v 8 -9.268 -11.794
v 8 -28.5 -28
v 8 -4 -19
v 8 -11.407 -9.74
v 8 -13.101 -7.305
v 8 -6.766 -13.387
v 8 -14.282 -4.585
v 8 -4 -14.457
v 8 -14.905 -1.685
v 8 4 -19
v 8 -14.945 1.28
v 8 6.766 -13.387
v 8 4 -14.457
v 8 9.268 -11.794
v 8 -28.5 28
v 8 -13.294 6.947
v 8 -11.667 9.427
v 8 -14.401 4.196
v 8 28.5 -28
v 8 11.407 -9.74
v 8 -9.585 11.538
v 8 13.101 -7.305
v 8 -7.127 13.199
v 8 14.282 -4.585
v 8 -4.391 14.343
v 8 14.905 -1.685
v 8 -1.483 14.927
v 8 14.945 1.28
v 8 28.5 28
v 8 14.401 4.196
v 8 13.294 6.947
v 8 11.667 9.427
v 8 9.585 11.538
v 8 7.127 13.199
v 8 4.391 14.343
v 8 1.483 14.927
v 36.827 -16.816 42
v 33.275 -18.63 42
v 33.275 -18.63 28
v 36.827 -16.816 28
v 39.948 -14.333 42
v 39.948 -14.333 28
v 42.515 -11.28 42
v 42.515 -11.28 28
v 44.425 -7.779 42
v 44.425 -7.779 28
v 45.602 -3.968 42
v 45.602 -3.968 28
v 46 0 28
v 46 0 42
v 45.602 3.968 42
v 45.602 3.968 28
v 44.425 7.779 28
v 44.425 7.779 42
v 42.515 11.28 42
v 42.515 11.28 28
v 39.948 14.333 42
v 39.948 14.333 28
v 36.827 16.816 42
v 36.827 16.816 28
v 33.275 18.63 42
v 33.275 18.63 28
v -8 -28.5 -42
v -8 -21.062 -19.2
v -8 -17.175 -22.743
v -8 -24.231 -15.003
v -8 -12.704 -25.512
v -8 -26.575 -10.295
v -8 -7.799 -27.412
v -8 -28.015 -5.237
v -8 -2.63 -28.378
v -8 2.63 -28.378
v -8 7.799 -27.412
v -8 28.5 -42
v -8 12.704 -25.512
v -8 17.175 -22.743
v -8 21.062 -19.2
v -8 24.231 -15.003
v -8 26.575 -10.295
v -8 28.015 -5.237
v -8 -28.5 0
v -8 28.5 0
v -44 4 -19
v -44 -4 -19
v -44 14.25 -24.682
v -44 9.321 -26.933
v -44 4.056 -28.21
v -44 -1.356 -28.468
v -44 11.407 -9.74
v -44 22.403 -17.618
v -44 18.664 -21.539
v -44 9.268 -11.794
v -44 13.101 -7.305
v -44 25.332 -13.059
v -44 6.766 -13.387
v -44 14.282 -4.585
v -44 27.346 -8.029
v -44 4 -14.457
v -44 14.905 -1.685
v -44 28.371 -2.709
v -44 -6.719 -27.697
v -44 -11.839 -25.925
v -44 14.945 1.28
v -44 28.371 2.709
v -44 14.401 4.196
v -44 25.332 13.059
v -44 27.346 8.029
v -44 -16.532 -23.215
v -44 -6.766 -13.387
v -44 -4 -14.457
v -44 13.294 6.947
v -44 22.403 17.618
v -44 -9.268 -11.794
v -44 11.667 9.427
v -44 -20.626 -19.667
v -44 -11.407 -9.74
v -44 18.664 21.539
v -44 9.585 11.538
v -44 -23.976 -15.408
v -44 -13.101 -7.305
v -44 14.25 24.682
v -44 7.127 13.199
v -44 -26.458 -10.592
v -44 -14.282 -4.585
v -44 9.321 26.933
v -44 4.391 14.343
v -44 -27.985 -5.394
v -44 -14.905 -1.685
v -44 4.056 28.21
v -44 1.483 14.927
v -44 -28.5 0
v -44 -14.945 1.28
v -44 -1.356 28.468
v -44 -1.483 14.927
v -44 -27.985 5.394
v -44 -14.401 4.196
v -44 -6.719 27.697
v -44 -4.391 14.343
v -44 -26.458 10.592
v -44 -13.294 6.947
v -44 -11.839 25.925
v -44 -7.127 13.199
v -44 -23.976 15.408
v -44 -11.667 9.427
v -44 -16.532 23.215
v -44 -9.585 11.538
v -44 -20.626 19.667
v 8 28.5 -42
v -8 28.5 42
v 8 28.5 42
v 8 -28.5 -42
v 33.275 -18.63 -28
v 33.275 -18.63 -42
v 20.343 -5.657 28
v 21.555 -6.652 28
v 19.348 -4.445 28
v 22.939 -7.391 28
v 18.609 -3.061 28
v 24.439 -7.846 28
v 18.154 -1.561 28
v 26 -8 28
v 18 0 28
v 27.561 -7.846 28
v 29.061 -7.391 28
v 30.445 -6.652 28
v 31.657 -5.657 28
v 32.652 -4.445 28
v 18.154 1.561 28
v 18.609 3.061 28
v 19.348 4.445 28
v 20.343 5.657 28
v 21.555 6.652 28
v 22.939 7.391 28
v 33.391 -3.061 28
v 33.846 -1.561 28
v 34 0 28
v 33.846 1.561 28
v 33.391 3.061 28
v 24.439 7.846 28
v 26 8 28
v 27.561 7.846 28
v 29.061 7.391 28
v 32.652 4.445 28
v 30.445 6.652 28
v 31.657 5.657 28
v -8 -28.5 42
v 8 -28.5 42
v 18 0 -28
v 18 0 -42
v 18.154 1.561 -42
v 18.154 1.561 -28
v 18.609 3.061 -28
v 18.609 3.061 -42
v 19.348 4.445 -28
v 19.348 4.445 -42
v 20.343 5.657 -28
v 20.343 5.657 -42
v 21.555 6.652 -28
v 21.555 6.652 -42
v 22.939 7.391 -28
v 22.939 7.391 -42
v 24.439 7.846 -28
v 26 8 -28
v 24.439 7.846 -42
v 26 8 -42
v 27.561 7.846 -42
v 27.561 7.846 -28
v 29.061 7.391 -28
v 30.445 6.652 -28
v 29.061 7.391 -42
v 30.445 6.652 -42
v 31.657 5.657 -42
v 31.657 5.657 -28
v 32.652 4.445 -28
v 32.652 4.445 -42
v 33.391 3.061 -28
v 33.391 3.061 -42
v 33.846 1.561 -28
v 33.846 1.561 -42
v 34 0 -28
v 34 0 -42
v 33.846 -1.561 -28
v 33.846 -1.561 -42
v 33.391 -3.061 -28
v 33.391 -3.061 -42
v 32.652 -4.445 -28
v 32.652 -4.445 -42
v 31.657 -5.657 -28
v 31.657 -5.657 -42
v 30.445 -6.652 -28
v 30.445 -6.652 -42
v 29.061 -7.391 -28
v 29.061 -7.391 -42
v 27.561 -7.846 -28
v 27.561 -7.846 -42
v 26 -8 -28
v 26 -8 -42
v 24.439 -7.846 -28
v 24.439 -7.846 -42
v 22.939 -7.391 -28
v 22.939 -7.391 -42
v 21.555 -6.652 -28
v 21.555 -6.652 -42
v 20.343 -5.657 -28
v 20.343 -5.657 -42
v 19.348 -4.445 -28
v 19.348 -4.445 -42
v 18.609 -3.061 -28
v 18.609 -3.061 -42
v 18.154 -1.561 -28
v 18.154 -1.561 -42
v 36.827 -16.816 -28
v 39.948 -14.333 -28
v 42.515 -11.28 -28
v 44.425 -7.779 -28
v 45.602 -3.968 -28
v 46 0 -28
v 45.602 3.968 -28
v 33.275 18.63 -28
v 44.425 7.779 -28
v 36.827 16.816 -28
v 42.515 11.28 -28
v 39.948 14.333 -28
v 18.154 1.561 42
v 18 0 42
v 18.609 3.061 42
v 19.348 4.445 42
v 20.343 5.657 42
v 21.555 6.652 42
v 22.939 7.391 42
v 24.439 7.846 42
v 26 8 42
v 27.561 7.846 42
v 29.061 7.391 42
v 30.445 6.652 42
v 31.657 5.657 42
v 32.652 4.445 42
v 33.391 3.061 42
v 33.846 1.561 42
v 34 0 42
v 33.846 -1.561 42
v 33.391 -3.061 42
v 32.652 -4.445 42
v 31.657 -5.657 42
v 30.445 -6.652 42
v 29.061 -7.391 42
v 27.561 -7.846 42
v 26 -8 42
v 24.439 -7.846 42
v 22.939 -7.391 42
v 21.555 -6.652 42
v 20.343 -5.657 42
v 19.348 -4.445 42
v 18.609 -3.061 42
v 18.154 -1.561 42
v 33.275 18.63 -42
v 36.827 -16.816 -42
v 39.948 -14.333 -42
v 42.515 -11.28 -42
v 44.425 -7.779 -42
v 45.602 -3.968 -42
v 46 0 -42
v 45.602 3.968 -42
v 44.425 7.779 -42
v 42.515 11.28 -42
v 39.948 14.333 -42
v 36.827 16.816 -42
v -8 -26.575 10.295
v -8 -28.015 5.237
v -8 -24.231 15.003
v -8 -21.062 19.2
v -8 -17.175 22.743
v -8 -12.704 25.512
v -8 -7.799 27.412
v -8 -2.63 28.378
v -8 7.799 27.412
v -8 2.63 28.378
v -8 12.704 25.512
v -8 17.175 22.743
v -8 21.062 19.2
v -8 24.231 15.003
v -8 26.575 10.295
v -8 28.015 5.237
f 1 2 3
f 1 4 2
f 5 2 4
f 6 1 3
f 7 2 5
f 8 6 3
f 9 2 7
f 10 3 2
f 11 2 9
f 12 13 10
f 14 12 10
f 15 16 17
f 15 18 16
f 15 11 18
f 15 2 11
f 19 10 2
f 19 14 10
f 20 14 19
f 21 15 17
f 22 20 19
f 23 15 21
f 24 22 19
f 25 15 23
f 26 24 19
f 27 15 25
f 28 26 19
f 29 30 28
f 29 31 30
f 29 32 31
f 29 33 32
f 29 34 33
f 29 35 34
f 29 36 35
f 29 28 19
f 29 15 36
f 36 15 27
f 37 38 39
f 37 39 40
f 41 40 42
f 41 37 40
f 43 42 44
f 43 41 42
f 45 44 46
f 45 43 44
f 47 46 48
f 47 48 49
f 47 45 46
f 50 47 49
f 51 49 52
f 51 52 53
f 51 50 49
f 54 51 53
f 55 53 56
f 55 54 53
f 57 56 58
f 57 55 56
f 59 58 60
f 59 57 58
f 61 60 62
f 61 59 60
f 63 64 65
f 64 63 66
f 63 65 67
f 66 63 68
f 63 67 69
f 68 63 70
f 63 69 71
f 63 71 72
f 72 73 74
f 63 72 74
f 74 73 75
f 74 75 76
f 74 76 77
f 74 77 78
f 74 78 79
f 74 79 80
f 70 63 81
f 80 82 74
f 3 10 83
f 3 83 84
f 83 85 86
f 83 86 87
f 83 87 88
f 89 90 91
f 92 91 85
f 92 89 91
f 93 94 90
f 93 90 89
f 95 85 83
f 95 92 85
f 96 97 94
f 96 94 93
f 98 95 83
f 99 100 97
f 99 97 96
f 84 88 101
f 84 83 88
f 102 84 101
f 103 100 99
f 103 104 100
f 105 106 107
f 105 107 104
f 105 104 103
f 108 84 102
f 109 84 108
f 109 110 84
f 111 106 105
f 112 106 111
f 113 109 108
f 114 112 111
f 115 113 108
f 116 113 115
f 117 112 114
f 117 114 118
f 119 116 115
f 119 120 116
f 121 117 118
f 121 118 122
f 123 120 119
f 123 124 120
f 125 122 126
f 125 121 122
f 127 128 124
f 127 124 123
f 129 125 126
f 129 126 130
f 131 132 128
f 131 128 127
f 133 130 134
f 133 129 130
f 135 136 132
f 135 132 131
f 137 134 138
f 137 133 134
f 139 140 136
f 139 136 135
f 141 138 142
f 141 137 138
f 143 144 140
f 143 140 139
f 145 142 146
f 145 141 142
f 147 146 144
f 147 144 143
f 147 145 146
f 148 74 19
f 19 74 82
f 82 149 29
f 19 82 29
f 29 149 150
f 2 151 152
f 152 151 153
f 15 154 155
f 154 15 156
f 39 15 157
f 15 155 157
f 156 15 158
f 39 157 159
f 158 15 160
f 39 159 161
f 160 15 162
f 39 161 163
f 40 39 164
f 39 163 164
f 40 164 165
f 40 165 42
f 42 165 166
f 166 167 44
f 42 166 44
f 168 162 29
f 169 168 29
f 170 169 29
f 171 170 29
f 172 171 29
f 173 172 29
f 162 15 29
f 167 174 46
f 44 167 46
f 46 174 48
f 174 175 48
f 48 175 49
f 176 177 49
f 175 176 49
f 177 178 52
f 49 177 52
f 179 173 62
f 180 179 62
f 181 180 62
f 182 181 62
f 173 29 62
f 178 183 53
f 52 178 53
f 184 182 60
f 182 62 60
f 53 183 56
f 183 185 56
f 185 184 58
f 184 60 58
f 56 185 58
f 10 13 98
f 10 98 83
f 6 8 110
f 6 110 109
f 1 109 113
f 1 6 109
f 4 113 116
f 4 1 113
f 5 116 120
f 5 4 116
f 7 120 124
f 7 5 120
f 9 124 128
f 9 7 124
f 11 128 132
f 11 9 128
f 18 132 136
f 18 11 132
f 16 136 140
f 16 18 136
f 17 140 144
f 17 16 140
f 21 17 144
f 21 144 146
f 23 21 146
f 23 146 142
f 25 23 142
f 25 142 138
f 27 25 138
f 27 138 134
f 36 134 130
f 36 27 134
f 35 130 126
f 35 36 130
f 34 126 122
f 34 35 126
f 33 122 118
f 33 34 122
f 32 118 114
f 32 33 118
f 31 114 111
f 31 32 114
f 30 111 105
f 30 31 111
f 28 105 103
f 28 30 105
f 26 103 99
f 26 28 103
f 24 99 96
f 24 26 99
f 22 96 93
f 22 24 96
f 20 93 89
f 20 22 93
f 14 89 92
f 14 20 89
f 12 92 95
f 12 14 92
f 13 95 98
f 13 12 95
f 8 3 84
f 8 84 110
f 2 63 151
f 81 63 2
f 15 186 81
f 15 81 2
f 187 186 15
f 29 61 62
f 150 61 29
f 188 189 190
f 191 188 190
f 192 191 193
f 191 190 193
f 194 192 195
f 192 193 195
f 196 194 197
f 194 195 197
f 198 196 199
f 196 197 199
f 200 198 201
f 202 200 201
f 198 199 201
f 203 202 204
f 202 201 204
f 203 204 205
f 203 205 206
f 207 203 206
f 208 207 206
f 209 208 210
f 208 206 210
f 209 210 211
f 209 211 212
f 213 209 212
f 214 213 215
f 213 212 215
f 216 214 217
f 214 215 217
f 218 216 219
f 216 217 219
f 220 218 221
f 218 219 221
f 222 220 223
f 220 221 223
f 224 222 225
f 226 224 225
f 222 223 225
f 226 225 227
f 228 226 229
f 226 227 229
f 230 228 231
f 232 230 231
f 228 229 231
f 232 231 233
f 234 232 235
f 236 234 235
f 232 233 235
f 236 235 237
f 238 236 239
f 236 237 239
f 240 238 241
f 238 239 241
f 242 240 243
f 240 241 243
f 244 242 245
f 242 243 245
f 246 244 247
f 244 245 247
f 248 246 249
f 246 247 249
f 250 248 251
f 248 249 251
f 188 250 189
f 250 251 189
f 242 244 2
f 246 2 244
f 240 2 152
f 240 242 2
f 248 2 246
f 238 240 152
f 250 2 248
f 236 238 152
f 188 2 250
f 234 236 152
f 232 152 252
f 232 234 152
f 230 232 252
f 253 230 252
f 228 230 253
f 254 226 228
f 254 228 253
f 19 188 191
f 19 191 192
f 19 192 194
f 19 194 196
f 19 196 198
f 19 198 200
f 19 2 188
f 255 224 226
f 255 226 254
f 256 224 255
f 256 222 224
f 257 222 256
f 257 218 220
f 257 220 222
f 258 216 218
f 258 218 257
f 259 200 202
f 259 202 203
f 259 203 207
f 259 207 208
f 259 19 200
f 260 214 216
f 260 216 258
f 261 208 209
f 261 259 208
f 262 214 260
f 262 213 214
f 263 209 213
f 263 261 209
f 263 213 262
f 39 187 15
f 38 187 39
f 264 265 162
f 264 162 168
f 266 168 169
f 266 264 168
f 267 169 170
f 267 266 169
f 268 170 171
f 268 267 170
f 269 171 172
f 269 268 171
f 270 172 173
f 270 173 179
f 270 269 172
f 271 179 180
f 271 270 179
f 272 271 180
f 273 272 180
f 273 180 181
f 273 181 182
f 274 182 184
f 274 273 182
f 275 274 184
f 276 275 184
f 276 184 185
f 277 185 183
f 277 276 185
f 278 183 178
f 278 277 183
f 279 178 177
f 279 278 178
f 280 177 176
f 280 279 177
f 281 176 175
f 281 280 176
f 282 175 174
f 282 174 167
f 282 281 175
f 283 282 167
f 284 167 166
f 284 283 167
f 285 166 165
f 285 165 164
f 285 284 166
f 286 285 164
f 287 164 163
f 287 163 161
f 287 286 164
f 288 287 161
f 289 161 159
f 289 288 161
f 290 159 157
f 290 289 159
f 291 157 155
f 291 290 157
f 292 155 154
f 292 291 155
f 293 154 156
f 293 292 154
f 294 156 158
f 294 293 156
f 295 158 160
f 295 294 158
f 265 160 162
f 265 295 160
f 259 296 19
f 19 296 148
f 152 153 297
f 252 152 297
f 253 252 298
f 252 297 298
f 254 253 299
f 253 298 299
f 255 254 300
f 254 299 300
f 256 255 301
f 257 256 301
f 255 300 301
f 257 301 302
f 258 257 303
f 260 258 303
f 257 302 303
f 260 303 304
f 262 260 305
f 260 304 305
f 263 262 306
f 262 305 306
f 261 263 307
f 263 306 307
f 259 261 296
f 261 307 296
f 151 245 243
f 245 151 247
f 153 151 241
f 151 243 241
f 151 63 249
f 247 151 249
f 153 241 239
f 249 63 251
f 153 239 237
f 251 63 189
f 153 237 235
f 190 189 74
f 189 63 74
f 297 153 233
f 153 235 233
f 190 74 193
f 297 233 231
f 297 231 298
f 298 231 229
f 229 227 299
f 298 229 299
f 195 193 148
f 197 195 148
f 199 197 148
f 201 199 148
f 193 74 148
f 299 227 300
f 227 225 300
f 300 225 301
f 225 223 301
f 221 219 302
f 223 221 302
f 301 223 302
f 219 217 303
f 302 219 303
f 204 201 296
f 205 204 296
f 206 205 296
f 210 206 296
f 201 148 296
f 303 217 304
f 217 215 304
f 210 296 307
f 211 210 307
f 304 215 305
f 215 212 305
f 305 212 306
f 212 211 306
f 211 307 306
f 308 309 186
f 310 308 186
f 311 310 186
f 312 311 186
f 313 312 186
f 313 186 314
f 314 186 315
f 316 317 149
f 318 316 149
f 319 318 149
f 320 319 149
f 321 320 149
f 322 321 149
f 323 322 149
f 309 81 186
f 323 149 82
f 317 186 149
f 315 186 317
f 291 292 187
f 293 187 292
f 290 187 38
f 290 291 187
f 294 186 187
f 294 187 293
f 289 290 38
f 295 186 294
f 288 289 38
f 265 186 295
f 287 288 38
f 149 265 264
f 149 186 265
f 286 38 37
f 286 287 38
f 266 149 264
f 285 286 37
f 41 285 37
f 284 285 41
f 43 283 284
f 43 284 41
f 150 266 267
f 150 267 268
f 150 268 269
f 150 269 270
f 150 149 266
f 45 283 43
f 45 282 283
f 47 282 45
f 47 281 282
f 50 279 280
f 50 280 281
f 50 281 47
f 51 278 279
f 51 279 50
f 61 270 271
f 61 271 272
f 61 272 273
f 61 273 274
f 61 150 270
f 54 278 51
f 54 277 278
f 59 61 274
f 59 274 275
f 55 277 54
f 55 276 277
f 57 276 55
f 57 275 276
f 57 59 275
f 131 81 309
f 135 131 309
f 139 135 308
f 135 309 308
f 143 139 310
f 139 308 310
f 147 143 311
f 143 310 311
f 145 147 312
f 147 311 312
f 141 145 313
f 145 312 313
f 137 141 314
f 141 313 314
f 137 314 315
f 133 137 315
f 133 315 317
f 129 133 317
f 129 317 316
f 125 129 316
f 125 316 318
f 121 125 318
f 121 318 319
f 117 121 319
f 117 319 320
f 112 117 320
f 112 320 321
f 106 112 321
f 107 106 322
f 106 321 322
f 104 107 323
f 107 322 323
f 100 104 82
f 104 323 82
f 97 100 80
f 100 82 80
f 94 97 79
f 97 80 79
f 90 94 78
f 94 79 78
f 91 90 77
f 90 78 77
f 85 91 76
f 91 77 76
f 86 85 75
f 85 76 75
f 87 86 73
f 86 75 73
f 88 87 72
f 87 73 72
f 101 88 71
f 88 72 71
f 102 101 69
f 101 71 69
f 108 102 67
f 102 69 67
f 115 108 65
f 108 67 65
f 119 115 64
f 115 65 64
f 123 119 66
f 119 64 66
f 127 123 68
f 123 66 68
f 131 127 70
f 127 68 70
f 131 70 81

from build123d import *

# Parameters (mm, degrees)
SKETCH1_W               = 16
SKETCH1_H               = 57
BOSS_EXTRUDE1_DEPTH     = 42
SKETCH3_R               = 8
BOSS_EXTRUDE4_DEPTH     = 14
SKETCH6_R               = 28.5
SKETCH6_R_2             = 15
BOSS_EXTRUDE5_DEPTH     = 36
CUT_EXTRUDE1_START      = -36
SKETCH8_R               = 15
CUT_EXTRUDE1_DEPTH      = 36
CUT_EXTRUDE3_DEPTH      = 104.325940596
CUT_EXTRUDE3_DEPTH_BACK = 104.325940596


with BuildPart() as part:
    # Sketch1 → Boss-Extrude1 (new, symmetric)
    with BuildSketch(Plane.XY):
        Rectangle(SKETCH1_W, SKETCH1_H)
    extrude(amount=BOSS_EXTRUDE1_DEPTH, both=True)

    # Sketch3 → Boss-Extrude4 (add)
    with BuildSketch(Plane(origin=(0, 0, -42), x_dir=(-1, 0, 0), z_dir=(0, 0, -1))):
        with BuildLine():
            Line((-33.275105345, 18.629891095), (-8, 28.5))
            Line((-8, 28.5), (-8, -28.5))
            Line((-8, -28.5), (-33.275105345, -18.629891095))
            ThreePointArc((-33.275105345, -18.629891095), (-46, 0), (-33.275105345, 18.629891095))
        make_face()
        with Locations((-26, 0)):
            Circle(SKETCH3_R, mode=Mode.SUBTRACT)
    boss_extrude4 = extrude(amount=-BOSS_EXTRUDE4_DEPTH)

    # Mirror6: Boss-Extrude4 across plane
    add(boss_extrude4.mirror(Plane.XY))

    # Sketch6 → Boss-Extrude5 (add)
    with BuildSketch(Plane.ZY.offset(8)):
        with Locations(Location((0, 0, 0), (0, 0, 270))):
            Circle(SKETCH6_R)
        with Locations(Location((0, 0, 0), (0, 0, 270))):
            Circle(SKETCH6_R_2, mode=Mode.SUBTRACT)
    extrude(amount=BOSS_EXTRUDE5_DEPTH)

    # Sketch8 → Cut-Extrude1 (cut)
    with BuildSketch(Plane.ZY.offset(8).offset(CUT_EXTRUDE1_START)):
        with Locations(Location((0, 0, 0), (0, 0, 270))):
            Circle(SKETCH8_R)
    extrude(amount=CUT_EXTRUDE1_DEPTH, mode=Mode.SUBTRACT)

    # Sketch9 → Cut-Extrude3 (cut, two sides: drawn at the far end of the back side and taken through both)
    with BuildSketch(Plane.ZY.offset(44).offset(-CUT_EXTRUDE3_DEPTH_BACK)):
        with BuildLine():
            ThreePointArc((-14.456832295, -4), (-14.863587797, -2.018355219), (-15, 0))
            Line((-15, 0), (-19, 0))
            Line((-19, 0), (-19, -4))
            Line((-19, -4), (-14.456832295, -4))
        make_face()
        with BuildLine():
            Line((-19, 0), (-15, 0))
            ThreePointArc((-15, 0), (-14.863587797, 2.018355219), (-14.456832295, 4))
            Line((-14.456832295, 4), (-19, 4))
            Line((-19, 4), (-19, 0))
        make_face()
        with BuildLine():
            ThreePointArc((-14.456832295, 4), (-14.863587797, 2.018355219), (-15, 0))
            ThreePointArc((-15, 0), (-14.863587797, -2.018355219), (-14.456832295, -4))
            Line((-14.456832295, -4), (-12.246493105, -4))
            Line((-12.246493105, -4), (-12.246493105, 4))
            Line((-12.246493105, 4), (-14.456832295, 4))
        make_face()
        with BuildLine():
            ThreePointArc((15, 0), (2.018355219, 14.863587797), (-14.456832295, 4))
            Line((-14.456832295, 4), (-12.246493105, 4))
            Line((-12.246493105, 4), (-12.246493105, -4))
            Line((-12.246493105, -4), (-14.456832295, -4))
            ThreePointArc((-14.456832295, -4), (2.018355219, -14.863587797), (15, 0))
        make_face()
    extrude(amount=CUT_EXTRUDE3_DEPTH + CUT_EXTRUDE3_DEPTH_BACK, mode=Mode.SUBTRACT)


solid = part.part
